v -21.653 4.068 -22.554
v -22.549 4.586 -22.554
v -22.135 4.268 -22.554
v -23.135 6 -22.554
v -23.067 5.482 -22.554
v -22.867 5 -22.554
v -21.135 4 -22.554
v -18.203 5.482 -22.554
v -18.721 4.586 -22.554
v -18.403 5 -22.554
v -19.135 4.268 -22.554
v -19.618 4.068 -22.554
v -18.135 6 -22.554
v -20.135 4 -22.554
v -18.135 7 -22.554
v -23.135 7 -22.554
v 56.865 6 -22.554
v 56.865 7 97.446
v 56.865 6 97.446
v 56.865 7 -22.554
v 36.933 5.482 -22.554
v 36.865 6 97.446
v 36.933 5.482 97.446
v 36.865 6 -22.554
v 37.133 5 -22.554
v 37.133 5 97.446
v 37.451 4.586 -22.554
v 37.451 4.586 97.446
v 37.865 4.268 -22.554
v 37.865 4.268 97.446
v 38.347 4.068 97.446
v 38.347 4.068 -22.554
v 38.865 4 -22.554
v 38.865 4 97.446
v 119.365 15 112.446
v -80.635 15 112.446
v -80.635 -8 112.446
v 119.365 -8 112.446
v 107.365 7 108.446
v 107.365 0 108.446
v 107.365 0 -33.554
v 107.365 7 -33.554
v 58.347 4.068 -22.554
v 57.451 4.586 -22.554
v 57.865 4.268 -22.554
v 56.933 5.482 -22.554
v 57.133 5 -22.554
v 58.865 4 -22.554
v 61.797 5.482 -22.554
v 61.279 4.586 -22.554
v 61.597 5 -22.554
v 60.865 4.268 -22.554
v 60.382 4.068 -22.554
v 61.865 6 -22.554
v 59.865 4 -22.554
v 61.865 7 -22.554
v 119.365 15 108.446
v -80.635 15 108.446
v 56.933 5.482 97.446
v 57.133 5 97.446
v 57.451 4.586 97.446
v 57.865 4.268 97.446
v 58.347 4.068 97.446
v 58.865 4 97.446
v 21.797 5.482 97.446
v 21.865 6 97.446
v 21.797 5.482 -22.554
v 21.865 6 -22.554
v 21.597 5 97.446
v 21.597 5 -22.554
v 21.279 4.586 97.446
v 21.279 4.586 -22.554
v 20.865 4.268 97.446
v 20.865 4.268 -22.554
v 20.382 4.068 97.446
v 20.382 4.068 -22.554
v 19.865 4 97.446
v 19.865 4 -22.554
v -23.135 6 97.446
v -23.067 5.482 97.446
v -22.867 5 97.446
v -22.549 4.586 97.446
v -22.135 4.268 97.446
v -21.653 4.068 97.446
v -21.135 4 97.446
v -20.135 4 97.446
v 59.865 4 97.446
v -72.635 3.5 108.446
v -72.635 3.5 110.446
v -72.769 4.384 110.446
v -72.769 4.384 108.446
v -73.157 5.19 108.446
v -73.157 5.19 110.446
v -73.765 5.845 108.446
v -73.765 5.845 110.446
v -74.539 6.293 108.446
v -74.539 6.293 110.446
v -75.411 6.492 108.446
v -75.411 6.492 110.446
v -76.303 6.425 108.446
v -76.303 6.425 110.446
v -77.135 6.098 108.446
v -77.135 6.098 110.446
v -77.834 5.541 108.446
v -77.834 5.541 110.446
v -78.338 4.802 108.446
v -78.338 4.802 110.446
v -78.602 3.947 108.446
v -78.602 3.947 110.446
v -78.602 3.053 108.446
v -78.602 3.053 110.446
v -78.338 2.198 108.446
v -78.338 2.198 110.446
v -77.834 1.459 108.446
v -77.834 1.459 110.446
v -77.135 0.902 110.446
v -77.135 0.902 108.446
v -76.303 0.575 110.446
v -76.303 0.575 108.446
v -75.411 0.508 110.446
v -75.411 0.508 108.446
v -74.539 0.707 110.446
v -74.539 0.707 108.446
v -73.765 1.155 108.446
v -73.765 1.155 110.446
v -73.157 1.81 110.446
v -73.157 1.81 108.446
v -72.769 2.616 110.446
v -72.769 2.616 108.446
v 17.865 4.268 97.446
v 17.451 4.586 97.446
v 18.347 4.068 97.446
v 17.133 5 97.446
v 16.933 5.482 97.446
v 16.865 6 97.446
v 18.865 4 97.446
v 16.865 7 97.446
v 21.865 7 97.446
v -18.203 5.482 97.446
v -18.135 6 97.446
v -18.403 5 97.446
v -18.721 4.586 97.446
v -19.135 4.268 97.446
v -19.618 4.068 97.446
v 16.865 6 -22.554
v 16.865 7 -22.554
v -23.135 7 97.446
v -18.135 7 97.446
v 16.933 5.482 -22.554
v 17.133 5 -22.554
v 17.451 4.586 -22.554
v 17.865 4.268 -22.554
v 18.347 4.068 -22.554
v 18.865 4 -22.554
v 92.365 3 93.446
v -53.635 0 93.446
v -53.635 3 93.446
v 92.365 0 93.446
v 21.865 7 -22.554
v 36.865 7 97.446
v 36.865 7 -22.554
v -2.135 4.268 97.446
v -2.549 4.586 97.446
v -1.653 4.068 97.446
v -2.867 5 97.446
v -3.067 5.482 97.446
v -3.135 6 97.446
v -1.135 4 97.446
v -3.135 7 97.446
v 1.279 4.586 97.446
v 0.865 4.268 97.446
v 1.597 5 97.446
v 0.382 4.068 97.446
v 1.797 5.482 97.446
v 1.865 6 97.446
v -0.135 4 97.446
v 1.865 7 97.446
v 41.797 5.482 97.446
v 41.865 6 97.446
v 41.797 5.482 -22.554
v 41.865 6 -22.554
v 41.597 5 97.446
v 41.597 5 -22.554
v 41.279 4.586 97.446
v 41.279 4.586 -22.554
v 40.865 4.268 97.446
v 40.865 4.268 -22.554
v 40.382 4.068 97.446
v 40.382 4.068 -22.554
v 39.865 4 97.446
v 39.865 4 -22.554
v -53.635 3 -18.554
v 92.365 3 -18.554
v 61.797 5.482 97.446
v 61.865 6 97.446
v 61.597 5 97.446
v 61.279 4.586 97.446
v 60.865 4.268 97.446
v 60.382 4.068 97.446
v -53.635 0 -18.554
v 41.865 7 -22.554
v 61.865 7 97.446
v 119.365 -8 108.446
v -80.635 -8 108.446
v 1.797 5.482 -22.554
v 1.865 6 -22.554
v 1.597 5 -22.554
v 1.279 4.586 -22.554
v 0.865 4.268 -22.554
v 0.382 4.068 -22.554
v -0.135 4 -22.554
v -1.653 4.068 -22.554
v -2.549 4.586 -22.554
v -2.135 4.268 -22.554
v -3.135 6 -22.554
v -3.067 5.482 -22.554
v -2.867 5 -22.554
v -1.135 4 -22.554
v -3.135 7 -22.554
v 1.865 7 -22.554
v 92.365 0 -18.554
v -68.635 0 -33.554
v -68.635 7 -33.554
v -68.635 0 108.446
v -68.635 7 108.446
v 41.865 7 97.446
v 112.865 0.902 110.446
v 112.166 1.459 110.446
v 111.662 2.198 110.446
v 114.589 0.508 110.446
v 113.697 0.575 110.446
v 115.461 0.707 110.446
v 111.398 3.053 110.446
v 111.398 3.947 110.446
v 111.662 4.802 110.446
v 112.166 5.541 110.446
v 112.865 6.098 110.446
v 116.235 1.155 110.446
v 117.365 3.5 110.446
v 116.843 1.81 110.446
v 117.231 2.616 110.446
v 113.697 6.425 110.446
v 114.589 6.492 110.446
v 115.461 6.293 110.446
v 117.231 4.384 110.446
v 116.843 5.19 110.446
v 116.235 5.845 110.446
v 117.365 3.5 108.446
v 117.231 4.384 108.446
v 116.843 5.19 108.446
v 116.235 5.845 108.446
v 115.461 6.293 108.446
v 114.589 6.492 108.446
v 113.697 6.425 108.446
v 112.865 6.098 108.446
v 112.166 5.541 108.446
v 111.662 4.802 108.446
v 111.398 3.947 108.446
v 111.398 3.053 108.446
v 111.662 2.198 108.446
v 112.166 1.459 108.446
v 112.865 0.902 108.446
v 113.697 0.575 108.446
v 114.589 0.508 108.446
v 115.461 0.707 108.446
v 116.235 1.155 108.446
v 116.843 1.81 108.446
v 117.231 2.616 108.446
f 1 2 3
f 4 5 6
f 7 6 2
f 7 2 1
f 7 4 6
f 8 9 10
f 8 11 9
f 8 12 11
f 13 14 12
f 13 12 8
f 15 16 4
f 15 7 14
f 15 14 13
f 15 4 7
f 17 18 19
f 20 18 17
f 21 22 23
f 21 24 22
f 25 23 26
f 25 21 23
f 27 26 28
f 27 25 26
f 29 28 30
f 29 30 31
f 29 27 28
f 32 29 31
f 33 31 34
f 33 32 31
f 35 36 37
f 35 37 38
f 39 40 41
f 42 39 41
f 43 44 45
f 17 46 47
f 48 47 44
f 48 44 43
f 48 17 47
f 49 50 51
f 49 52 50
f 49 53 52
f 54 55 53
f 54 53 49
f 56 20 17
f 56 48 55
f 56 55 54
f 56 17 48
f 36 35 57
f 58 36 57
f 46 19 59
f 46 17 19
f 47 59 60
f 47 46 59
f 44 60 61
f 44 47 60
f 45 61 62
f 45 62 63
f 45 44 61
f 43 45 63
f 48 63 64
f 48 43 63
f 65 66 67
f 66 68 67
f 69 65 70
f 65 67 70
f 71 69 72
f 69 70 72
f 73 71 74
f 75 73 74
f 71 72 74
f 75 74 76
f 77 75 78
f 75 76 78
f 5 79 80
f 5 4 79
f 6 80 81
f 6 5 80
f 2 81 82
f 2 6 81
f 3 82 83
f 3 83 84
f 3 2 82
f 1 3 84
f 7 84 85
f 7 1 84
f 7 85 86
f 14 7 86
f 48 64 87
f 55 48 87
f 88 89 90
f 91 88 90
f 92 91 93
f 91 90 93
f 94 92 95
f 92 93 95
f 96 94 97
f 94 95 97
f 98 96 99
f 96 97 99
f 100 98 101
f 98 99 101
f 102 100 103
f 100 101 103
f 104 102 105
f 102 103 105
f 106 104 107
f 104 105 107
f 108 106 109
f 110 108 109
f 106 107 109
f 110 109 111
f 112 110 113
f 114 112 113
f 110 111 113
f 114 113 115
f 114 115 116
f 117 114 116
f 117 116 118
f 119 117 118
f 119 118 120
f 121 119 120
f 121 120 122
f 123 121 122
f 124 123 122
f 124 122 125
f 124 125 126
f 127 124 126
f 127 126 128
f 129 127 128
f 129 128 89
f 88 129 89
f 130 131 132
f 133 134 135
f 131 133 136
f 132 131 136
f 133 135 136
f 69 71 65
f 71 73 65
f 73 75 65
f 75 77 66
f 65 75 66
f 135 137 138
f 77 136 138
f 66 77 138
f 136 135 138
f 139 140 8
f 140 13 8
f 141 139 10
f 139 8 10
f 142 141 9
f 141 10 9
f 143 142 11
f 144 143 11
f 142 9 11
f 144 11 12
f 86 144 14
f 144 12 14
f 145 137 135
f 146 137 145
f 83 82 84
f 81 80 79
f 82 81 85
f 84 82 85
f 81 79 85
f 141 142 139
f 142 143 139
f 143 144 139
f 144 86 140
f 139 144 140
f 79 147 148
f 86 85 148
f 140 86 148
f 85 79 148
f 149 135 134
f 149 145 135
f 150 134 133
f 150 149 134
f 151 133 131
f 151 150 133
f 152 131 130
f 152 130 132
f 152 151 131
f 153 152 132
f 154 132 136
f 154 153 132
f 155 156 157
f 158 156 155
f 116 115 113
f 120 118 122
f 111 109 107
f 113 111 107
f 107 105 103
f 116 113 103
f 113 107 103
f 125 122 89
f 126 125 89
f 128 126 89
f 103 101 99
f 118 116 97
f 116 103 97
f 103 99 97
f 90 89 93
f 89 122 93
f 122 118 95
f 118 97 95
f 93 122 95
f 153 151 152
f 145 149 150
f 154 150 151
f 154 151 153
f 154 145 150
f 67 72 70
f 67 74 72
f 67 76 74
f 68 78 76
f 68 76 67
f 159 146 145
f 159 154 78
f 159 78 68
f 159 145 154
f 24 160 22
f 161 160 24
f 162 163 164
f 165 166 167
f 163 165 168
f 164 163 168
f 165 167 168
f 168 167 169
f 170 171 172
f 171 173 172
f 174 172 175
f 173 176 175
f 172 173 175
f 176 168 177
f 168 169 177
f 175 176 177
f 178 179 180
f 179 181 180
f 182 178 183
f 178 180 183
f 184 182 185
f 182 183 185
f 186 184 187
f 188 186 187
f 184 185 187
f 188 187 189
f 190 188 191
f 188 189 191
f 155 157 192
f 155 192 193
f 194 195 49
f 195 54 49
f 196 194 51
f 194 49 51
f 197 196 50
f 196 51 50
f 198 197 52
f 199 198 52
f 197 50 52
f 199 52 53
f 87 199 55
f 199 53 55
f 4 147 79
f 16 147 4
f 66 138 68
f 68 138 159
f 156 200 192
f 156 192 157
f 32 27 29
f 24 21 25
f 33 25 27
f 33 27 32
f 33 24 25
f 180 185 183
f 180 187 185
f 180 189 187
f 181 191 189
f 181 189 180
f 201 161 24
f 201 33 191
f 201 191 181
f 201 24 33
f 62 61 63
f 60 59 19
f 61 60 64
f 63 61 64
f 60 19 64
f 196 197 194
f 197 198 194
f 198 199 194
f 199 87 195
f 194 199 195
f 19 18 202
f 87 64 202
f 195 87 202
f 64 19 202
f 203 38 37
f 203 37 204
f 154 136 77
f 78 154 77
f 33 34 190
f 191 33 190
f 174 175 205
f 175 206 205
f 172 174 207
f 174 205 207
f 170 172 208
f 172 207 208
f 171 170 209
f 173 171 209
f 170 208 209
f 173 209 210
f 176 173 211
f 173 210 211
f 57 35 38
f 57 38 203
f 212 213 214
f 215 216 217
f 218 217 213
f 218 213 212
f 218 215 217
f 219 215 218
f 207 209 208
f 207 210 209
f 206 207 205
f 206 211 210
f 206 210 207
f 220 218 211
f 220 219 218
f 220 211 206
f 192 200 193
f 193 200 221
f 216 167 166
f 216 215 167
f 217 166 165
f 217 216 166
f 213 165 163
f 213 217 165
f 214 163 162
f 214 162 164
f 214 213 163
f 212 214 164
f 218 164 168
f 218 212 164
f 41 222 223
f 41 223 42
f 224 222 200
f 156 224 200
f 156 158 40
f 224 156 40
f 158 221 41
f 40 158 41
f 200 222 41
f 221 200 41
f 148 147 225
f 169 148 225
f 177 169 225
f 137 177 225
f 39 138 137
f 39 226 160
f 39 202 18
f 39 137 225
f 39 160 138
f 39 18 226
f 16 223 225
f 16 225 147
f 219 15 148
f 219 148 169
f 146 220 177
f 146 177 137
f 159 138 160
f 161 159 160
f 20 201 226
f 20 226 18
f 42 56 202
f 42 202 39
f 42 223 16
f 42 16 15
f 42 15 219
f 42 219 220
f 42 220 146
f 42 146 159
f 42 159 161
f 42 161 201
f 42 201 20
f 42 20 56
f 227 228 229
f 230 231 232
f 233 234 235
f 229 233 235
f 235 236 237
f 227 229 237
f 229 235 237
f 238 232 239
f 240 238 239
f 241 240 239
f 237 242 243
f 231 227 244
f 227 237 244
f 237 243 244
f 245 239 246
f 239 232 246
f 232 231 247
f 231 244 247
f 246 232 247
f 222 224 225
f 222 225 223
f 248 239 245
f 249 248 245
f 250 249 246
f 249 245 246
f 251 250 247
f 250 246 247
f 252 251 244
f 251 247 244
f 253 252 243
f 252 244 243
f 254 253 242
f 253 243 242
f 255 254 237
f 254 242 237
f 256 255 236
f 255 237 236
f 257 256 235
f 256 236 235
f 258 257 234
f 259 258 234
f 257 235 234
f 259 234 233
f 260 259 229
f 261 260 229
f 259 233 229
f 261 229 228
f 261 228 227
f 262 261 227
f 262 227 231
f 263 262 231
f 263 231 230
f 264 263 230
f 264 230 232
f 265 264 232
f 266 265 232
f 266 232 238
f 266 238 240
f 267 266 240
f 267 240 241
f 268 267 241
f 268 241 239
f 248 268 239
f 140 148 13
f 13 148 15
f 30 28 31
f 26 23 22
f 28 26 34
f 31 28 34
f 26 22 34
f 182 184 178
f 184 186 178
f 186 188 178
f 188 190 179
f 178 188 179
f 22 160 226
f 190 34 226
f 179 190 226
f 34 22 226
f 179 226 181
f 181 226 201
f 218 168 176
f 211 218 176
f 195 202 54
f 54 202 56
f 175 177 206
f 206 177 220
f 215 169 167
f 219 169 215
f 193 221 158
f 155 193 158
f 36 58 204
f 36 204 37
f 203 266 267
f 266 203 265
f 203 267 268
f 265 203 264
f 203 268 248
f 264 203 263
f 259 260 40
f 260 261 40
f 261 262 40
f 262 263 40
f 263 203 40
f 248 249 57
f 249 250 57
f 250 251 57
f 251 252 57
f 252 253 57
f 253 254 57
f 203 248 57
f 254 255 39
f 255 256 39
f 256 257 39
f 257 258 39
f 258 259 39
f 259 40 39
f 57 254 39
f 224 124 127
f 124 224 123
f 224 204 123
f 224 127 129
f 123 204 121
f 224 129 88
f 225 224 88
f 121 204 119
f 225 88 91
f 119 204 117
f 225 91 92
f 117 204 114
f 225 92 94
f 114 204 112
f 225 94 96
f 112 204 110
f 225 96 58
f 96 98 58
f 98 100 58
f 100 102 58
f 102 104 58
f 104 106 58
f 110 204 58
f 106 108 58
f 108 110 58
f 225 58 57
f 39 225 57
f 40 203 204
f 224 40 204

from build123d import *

# Parameters (mm, degrees)
SKETCH1_W           = 176
SKETCH1_H           = 142
BOSS_EXTRUDE1_DEPTH = 7
SKETCH2_W           = 192
SKETCH2_H           = 23
BOSS_EXTRUDE2_DEPTH = 4
SKETCH3_W           = 146
SKETCH3_H           = 112
CUT_EXTRUDE1_DEPTH  = 3
SKETCH4_W           = 5
SKETCH4_H           = 120
CUT_EXTRUDE2_DEPTH  = 3
FILLET1_R           = 2
SKETCH6_W           = 4
SKETCH6_H           = 23
BOSS_EXTRUDE3_DEPTH = 4
SKETCH7_W           = 4
SKETCH7_H           = 23
BOSS_EXTRUDE4_DEPTH = 4
SKETCH5_R           = 3
CUT_EXTRUDE3_DEPTH  = 190.179668735
SKETCH8_R           = 3
BOSS_EXTRUDE5_DEPTH = 2


with BuildPart() as part:
    # Sketch1 → Boss-Extrude1 (new body)
    with BuildSketch(Plane(origin=(0, 0, 0), x_dir=(1, 0, 0), z_dir=(0, 1, 0))):
        with Locations((19.364764745, -37.446274738)):
            Rectangle(SKETCH1_W, SKETCH1_H)
    extrude(amount=BOSS_EXTRUDE1_DEPTH)

    # Sketch2 → Boss-Extrude2 (add)
    with BuildSketch(Plane.XY.offset(108.446274738)):
        with Locations((19.364764745, 3.5)):
            Rectangle(SKETCH2_W, SKETCH2_H)
    extrude(amount=BOSS_EXTRUDE2_DEPTH)

    # Sketch3 → Cut-Extrude1 (cut)
    with BuildSketch(Plane.XZ):
        with Locations((19.364764745, 37.446274738)):
            Rectangle(SKETCH3_W, SKETCH3_H)
    extrude(amount=-CUT_EXTRUDE1_DEPTH, mode=Mode.SUBTRACT)

    # Sketch4 → Cut-Extrude2 (cut)
    with BuildSketch(Plane(origin=(0, 7, 0), x_dir=(1, 0, 0), z_dir=(0, 1, 0))):
        with Locations((19.364764745, -37.446274738)):
            Rectangle(SKETCH4_W, SKETCH4_H)
        with Locations((39.364764745, -37.446274738)):
            Rectangle(SKETCH4_W, SKETCH4_H)
        with Locations((-0.635235255, -37.446274738)):
            Rectangle(SKETCH4_W, SKETCH4_H)
        with Locations((59.364764745, -37.446274738)):
            Rectangle(SKETCH4_W, SKETCH4_H)
        with Locations((-20.635235255, -37.446274738)):
            Rectangle(SKETCH4_W, SKETCH4_H)
    extrude(amount=-CUT_EXTRUDE2_DEPTH, mode=Mode.SUBTRACT)

    # Fillet1
    fillet1_edges = [part.edges().sort_by_distance(p)[0] for p in [
        (41.864764745, 4, 37.446274738),
        (36.864764745, 4, 37.446274738),
        (-3.135235255, 4, 37.446274738),
        (1.864764745, 4, 37.446274738),
        (61.864764745, 4, 37.446274738),
        (56.864764745, 4, 37.446274738),
        (-23.135235255, 4, 37.446274738),
        (-18.135235255, 4, 37.446274738),
        (21.864764745, 4, 37.446274738),
        (16.864764745, 4, 37.446274738),
    ]]
    fillet(fillet1_edges, radius=FILLET1_R)

    # Sketch6 → Boss-Extrude3 (add)
    with BuildSketch(Plane.ZY.offset(76.635235255)):
        with Locations((110.446274738, 3.5)):
            Rectangle(SKETCH6_W, SKETCH6_H)
    extrude(amount=BOSS_EXTRUDE3_DEPTH)

    # Sketch7 → Boss-Extrude4 (add)
    with BuildSketch(Plane(origin=(115.364764745, 0, 0), x_dir=(0, 0, -1), z_dir=(1, 0, 0))):
        with Locations((-110.446274738, 3.5)):
            Rectangle(SKETCH7_W, SKETCH7_H)
    extrude(amount=BOSS_EXTRUDE4_DEPTH)

    # Sketch5 → Cut-Extrude3 (cut, through all)
    with BuildSketch(Plane.XY.offset(112.446274738)):
        with Locations((-75.635235255, 3.5)):
            Circle(SKETCH5_R)
        with Locations((114.364764745, 3.5)):
            Circle(SKETCH5_R)
    extrude(amount=-CUT_EXTRUDE3_DEPTH, mode=Mode.SUBTRACT)

    # Sketch8 → Boss-Extrude5 (add)
    with BuildSketch(Plane.XY.offset(112.446274738)):
        with Locations((-75.635235255, 3.5)):
            Circle(SKETCH8_R)
        with Locations((114.364764745, 3.5)):
            Circle(SKETCH8_R)
    extrude(amount=-BOSS_EXTRUDE5_DEPTH)


solid = part.part
